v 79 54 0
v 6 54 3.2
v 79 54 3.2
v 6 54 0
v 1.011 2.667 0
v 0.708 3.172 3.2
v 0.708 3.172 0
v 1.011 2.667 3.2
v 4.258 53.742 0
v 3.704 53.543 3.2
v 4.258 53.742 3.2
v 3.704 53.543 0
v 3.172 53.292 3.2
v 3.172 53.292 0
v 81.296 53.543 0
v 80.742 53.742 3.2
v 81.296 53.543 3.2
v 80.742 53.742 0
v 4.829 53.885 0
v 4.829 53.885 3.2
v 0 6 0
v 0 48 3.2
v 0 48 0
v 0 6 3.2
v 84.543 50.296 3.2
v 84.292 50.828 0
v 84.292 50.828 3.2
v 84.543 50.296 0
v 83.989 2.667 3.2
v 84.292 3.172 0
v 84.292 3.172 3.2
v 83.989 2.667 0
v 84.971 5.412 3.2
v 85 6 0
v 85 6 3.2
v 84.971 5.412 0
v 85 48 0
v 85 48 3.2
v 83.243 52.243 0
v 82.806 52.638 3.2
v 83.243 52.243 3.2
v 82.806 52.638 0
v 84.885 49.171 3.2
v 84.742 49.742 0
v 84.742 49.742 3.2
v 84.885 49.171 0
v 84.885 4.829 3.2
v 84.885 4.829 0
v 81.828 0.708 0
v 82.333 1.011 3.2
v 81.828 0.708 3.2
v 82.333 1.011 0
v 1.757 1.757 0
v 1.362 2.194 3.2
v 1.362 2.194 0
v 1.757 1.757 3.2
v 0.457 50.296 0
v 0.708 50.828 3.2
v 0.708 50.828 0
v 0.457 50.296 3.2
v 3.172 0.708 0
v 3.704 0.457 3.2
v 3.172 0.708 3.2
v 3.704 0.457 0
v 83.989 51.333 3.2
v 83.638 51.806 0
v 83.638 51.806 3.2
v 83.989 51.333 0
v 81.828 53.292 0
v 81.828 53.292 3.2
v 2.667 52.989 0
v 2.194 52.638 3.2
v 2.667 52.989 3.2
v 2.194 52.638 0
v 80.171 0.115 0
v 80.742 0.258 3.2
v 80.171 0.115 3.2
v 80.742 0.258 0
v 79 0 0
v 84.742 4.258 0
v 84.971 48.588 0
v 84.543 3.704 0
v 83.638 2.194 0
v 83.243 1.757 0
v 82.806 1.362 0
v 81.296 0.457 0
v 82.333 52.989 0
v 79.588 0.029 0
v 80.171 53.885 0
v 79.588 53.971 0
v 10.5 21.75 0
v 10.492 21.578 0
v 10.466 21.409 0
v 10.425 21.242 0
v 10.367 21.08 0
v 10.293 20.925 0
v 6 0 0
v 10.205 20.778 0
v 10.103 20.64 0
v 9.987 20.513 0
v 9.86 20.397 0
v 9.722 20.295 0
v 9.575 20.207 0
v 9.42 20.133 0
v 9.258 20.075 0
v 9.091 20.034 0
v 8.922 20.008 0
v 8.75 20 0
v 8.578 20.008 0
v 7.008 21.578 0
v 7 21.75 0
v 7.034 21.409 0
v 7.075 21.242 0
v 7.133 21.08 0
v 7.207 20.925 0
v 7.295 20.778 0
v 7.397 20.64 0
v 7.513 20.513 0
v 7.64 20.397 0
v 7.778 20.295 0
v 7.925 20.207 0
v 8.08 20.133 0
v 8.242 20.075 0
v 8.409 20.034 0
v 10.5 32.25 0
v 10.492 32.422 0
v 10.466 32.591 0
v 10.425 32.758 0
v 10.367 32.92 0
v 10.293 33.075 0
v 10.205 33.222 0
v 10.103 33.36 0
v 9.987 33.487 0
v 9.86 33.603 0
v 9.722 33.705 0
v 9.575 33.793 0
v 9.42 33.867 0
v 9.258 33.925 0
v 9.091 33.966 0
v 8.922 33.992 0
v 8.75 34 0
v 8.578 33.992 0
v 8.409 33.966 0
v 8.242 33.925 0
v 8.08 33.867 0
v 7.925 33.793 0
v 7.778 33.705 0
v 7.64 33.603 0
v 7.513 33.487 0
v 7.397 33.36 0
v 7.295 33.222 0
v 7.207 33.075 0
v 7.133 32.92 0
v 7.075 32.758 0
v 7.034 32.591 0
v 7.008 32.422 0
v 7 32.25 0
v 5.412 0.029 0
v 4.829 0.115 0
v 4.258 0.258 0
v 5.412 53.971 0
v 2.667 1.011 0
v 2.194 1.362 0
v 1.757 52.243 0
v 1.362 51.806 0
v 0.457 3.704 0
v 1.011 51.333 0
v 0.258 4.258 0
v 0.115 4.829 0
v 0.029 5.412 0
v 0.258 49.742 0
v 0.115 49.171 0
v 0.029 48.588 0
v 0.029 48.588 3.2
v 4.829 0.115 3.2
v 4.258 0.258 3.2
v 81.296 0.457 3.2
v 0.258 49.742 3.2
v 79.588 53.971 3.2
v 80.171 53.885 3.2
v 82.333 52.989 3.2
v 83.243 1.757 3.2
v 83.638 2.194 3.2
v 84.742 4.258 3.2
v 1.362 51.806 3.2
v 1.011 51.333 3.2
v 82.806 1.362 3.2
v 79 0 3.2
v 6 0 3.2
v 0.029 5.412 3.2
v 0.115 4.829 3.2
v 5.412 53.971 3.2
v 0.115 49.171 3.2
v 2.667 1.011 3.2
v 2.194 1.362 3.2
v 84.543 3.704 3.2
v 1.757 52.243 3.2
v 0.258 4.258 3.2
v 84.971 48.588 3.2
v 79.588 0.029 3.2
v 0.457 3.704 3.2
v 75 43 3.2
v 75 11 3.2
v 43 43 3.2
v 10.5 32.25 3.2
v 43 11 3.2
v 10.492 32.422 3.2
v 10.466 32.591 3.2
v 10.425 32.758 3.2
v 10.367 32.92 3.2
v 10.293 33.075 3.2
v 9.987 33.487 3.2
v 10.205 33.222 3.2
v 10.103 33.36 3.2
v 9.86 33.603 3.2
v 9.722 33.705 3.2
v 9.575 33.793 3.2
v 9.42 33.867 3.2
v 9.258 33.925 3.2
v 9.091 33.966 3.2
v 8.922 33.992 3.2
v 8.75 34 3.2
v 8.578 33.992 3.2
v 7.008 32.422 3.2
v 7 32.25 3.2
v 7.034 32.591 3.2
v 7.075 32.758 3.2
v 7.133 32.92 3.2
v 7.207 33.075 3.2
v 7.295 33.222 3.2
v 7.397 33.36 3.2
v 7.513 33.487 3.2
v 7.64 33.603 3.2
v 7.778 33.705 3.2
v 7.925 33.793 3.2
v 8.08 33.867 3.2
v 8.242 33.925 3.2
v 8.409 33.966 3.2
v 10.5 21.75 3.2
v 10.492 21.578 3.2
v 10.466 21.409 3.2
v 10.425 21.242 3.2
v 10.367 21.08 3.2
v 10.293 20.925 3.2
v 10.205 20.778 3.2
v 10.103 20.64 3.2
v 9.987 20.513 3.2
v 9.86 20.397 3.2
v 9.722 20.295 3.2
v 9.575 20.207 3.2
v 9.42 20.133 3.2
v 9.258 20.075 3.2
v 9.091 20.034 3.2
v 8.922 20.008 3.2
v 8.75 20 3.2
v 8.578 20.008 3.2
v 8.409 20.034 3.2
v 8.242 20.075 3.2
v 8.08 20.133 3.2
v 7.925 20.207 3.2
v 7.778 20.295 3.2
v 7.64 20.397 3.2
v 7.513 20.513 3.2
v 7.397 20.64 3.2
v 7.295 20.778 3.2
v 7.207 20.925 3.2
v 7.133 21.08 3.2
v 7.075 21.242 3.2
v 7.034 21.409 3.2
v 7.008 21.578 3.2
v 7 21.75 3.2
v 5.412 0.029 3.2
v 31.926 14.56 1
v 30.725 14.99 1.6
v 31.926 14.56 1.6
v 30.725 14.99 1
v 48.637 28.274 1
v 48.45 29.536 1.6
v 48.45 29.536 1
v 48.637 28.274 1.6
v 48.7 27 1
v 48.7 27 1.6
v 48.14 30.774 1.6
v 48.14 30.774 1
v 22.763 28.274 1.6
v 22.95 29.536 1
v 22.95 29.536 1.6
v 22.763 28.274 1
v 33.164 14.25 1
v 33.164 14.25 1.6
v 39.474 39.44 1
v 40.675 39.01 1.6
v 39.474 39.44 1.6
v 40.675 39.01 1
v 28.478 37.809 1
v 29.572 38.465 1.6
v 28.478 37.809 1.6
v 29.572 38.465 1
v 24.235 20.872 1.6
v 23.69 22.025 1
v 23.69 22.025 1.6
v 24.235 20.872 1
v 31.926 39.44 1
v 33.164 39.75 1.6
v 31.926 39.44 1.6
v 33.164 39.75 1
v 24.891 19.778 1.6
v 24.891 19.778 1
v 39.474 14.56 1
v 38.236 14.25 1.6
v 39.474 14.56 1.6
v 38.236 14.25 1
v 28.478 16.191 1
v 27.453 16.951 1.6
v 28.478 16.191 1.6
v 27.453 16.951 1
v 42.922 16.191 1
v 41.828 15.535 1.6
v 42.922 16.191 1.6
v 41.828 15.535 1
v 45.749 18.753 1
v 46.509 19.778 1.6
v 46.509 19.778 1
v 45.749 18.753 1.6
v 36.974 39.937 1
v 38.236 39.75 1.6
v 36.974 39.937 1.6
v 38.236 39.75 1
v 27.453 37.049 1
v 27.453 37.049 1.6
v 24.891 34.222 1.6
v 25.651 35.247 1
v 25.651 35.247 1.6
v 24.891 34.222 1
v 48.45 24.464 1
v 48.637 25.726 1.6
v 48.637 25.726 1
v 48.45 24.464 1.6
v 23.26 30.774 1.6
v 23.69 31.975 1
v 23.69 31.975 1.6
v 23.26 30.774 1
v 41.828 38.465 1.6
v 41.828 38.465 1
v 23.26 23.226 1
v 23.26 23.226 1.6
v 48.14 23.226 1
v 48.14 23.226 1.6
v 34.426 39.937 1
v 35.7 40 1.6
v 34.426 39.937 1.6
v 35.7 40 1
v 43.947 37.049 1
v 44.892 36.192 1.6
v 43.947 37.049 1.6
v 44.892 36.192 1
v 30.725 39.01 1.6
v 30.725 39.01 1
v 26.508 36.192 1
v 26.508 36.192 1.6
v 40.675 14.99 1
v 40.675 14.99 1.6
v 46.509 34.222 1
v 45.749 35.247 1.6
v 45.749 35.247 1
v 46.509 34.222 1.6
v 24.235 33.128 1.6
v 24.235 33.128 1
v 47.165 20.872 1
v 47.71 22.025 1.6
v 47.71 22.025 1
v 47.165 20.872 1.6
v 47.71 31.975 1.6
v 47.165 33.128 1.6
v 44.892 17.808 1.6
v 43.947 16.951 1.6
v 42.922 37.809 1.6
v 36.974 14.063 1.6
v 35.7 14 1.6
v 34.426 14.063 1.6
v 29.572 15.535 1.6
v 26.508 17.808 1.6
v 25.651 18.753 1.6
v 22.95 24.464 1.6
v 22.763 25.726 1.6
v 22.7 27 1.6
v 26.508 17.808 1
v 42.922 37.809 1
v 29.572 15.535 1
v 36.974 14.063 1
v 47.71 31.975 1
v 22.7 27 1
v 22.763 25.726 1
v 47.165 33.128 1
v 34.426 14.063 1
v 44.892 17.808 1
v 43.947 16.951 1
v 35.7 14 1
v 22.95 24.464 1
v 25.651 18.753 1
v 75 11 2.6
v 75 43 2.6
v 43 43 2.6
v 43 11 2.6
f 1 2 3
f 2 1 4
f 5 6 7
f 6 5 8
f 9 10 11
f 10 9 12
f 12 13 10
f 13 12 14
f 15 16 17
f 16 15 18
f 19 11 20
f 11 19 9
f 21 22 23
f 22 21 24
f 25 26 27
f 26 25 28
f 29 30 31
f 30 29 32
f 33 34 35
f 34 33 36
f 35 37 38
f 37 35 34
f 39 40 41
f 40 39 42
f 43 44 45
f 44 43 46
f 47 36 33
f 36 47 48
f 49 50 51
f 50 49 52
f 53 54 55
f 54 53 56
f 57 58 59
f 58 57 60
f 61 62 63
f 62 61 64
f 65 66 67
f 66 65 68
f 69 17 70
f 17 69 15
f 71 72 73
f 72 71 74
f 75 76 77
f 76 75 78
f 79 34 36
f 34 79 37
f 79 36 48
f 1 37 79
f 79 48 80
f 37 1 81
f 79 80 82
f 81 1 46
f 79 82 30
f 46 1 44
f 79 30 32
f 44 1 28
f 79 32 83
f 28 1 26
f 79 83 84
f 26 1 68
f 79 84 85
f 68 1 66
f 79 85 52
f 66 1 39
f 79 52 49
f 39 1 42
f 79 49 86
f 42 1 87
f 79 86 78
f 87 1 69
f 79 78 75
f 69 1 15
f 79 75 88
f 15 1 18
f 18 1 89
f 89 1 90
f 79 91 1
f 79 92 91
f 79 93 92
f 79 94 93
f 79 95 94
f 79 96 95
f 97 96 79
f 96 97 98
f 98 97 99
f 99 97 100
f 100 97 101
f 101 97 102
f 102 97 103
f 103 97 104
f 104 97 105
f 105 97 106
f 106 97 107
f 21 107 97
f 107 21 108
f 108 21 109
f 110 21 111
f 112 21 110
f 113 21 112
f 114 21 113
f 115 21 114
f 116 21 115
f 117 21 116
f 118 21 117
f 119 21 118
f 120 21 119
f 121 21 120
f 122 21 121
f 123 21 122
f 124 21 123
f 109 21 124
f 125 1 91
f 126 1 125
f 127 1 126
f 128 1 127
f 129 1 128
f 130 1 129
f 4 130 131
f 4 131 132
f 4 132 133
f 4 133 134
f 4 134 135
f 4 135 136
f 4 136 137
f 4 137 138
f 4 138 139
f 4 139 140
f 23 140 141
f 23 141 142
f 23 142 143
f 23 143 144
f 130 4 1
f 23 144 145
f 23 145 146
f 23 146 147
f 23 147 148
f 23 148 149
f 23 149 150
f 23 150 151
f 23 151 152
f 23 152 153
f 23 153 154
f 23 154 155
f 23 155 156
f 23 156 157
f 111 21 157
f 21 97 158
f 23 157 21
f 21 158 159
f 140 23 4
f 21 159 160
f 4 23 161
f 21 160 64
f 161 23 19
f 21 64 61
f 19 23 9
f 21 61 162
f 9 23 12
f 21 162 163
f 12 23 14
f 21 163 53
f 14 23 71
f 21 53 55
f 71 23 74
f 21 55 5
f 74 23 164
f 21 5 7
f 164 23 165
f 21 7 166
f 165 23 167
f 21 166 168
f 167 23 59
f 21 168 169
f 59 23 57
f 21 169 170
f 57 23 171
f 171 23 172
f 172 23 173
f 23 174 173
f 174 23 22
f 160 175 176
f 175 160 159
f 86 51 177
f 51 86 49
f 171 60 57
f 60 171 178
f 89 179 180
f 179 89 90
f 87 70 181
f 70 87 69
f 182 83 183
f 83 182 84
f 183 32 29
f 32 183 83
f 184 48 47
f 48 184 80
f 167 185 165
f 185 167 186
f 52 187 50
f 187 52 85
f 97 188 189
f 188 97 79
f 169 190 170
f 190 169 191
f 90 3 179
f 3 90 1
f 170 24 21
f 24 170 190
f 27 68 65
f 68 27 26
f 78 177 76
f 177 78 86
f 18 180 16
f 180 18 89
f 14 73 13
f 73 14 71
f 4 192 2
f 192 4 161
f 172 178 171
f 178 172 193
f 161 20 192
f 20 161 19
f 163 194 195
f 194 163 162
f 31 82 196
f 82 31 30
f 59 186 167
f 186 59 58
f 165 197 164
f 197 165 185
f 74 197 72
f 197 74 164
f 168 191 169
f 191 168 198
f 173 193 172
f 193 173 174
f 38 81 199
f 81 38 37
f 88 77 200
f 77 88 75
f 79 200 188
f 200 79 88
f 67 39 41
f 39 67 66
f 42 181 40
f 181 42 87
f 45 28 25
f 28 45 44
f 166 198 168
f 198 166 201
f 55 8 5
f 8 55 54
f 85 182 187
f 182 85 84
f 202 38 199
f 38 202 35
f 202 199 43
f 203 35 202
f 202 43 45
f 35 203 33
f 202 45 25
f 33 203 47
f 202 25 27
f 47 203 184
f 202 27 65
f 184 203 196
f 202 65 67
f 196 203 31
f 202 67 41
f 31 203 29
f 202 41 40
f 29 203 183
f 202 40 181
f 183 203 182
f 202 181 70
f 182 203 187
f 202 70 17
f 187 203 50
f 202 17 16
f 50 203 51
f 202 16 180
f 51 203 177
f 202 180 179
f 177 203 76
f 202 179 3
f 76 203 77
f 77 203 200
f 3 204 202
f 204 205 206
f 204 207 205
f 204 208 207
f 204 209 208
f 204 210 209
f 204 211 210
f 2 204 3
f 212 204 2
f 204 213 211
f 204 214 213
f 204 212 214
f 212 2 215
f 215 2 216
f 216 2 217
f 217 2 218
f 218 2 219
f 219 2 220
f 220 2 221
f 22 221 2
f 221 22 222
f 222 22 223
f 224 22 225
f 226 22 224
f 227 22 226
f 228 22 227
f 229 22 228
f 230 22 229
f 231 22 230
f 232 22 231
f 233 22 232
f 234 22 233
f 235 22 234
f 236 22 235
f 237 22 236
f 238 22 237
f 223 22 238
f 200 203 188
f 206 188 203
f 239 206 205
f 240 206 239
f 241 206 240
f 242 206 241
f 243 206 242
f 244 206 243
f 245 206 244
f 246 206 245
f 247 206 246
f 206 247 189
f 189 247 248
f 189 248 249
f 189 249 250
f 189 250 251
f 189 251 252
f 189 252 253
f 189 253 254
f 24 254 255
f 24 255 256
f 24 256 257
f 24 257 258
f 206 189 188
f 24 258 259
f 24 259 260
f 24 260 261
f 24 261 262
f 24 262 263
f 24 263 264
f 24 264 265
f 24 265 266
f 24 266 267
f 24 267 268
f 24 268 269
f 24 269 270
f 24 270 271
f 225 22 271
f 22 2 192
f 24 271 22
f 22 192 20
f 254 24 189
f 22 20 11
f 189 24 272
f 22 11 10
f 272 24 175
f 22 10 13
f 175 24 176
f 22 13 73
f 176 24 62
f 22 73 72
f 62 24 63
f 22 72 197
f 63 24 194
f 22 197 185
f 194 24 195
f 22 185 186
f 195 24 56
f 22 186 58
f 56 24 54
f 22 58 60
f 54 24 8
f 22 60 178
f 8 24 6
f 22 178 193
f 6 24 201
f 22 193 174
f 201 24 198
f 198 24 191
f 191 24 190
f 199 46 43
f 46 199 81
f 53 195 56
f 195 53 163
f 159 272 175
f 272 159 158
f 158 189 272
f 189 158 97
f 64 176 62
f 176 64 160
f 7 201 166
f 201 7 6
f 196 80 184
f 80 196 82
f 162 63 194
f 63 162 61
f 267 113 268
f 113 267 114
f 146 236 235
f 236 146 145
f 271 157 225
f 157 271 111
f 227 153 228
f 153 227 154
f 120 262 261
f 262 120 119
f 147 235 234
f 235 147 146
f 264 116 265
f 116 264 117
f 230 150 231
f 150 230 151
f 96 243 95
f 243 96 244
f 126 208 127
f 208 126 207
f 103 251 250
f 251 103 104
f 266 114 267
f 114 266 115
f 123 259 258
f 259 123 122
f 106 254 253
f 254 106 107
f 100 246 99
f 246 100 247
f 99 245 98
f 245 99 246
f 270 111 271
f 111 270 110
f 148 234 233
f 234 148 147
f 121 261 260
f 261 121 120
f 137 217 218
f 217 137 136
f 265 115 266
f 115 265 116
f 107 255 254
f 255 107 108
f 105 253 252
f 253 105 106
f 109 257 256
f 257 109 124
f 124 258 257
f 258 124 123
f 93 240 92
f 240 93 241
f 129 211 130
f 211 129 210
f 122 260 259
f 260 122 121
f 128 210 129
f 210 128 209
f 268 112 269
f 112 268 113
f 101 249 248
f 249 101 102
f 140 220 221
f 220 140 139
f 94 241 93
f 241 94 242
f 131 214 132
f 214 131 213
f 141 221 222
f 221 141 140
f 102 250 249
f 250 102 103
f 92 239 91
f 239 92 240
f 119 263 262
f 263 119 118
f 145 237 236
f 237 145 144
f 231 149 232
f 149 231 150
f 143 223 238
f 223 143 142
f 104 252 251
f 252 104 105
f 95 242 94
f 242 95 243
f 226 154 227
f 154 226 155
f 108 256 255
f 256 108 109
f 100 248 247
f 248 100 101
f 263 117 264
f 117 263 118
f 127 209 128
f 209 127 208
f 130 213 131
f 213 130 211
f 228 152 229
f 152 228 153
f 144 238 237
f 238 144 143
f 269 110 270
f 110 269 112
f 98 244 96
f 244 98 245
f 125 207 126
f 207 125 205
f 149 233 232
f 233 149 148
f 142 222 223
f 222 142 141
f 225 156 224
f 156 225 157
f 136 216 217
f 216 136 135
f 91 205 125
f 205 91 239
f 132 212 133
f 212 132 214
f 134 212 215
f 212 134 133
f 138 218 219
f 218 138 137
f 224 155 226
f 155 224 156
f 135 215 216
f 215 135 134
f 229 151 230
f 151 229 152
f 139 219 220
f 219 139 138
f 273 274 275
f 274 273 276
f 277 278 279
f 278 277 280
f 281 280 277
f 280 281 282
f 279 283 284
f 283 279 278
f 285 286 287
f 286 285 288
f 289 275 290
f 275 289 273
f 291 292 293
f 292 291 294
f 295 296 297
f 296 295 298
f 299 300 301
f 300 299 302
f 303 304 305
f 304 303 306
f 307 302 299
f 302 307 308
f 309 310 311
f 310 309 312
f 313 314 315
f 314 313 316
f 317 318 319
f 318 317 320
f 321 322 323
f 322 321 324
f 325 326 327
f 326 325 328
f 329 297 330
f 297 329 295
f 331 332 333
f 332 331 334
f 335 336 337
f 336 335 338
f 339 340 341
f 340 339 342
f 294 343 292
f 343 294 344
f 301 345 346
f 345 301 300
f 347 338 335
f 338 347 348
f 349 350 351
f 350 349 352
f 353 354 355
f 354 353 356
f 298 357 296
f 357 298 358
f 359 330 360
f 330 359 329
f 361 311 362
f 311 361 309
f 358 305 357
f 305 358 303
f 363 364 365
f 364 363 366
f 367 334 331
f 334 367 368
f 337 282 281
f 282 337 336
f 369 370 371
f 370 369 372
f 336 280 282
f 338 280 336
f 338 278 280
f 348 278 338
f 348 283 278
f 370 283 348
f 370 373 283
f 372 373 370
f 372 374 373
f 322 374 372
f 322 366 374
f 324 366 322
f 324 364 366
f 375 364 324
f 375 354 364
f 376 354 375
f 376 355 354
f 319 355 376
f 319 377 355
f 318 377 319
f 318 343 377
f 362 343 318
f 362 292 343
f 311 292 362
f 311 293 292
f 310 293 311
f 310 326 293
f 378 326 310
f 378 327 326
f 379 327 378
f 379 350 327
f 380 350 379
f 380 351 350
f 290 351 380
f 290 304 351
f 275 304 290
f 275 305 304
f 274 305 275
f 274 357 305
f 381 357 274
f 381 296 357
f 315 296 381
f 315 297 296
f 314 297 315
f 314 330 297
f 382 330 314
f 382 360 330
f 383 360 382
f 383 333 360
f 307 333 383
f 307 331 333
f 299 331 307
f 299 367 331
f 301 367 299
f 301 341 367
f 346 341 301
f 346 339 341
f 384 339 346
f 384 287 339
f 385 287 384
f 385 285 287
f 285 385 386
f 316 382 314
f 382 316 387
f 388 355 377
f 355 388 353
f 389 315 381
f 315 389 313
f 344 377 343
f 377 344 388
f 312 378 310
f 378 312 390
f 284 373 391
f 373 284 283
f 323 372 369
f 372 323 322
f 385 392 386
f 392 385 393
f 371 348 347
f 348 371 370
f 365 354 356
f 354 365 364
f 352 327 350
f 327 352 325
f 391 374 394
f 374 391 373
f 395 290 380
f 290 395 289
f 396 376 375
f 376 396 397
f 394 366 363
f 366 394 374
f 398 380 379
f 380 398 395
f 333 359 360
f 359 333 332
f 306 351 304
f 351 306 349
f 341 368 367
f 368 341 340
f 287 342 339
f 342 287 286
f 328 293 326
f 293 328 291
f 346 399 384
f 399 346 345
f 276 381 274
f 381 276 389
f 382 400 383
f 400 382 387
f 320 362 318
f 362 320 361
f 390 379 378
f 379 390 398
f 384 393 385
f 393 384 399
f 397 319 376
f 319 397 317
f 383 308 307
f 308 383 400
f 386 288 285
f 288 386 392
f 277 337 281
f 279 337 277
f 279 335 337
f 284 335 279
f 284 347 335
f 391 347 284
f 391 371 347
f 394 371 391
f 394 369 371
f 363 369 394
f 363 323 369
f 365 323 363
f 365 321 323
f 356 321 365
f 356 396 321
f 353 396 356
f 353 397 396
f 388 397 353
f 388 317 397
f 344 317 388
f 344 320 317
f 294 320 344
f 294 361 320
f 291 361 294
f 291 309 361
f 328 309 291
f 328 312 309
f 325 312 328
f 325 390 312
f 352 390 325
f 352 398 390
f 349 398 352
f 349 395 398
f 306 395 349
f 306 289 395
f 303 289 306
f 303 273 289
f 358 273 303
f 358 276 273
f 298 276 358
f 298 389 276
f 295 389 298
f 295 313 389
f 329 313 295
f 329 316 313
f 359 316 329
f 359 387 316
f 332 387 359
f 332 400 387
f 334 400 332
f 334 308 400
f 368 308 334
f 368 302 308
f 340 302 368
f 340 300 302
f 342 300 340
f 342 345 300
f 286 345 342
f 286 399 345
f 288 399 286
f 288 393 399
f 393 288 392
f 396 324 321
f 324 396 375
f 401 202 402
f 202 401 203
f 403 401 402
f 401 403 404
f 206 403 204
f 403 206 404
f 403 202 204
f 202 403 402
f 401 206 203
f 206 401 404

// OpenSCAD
// ==========================================
// PARAMETRIC LUGGAGE TAG WITH NFC & QR CAVITY
// ==========================================

$fn = 64;

/* [Tag Dimensions] */
tag_length    = 85.0; // Standard credit-card length scale
tag_width     = 54.0;
tag_thickness = 3.2;  // Total thickness
corner_radius = 6.0;

/* [Strap Slot] */
slot_width     = 14.0; // Fits standard 12mm luggage strap or loop
slot_height    = 3.5;
slot_margin_x  = 7.0;  // Distance from tag edge to slot

/* [NFC Pocket (Internal Cavity)] */
nfc_diameter  = 26.0; // For standard 25mm circular NFC sticker (+1mm clearance)
nfc_depth     = 0.6;  // Accommodates 0.2mm sticker + adhesive without nozzle collision
nfc_floor_z   = 1.0;  // Solid plastic thickness beneath the sticker

/* [QR Code Inset] */
qr_size       = 32.0; // Square recessed window for QR decal or dual-extrusion tile
qr_recess     = 0.6;  // Depth from top face down
qr_margin_x   = 10.0; // Offset from right edge

// ==========================================
// GEOMETRY MODULES
// ==========================================

module rounded_rect(w, l, h, r) {
    translate([r, r, 0])
        minkowski() {
            cube([w - 2*r, l - 2*r, h / 2]);
            cylinder(r=r, h=h / 2);
        }
}

module luggage_tag() {
    difference() {
        // Main Tag Body
        rounded_rect(tag_length, tag_width, tag_thickness, corner_radius);

        // Strap Slot (Through-hole)
        translate([slot_margin_x, (tag_width - slot_width) / 2, -0.5])
            hull() {
                translate([slot_height/2, slot_height/2, 0])
                    cylinder(d=slot_height, h=tag_thickness + 1);
                translate([slot_height/2, slot_width - slot_height/2, 0])
                    cylinder(d=slot_height, h=tag_thickness + 1);
            }

        // Internal NFC Pocket (Enclosed inside the print)
        // Positioned in the center-left body area
        translate([tag_length * 0.42, tag_width / 2, nfc_floor_z])
            cylinder(d=nfc_diameter, h=nfc_depth);

        // Top QR Code Inset (Debossed window on upper surface)
        translate([tag_length - qr_size - qr_margin_x, (tag_width - qr_size) / 2, tag_thickness - qr_recess])
            cube([qr_size, qr_size, qr_recess + 0.1]);
    }
}

// Render the model
luggage_tag();
